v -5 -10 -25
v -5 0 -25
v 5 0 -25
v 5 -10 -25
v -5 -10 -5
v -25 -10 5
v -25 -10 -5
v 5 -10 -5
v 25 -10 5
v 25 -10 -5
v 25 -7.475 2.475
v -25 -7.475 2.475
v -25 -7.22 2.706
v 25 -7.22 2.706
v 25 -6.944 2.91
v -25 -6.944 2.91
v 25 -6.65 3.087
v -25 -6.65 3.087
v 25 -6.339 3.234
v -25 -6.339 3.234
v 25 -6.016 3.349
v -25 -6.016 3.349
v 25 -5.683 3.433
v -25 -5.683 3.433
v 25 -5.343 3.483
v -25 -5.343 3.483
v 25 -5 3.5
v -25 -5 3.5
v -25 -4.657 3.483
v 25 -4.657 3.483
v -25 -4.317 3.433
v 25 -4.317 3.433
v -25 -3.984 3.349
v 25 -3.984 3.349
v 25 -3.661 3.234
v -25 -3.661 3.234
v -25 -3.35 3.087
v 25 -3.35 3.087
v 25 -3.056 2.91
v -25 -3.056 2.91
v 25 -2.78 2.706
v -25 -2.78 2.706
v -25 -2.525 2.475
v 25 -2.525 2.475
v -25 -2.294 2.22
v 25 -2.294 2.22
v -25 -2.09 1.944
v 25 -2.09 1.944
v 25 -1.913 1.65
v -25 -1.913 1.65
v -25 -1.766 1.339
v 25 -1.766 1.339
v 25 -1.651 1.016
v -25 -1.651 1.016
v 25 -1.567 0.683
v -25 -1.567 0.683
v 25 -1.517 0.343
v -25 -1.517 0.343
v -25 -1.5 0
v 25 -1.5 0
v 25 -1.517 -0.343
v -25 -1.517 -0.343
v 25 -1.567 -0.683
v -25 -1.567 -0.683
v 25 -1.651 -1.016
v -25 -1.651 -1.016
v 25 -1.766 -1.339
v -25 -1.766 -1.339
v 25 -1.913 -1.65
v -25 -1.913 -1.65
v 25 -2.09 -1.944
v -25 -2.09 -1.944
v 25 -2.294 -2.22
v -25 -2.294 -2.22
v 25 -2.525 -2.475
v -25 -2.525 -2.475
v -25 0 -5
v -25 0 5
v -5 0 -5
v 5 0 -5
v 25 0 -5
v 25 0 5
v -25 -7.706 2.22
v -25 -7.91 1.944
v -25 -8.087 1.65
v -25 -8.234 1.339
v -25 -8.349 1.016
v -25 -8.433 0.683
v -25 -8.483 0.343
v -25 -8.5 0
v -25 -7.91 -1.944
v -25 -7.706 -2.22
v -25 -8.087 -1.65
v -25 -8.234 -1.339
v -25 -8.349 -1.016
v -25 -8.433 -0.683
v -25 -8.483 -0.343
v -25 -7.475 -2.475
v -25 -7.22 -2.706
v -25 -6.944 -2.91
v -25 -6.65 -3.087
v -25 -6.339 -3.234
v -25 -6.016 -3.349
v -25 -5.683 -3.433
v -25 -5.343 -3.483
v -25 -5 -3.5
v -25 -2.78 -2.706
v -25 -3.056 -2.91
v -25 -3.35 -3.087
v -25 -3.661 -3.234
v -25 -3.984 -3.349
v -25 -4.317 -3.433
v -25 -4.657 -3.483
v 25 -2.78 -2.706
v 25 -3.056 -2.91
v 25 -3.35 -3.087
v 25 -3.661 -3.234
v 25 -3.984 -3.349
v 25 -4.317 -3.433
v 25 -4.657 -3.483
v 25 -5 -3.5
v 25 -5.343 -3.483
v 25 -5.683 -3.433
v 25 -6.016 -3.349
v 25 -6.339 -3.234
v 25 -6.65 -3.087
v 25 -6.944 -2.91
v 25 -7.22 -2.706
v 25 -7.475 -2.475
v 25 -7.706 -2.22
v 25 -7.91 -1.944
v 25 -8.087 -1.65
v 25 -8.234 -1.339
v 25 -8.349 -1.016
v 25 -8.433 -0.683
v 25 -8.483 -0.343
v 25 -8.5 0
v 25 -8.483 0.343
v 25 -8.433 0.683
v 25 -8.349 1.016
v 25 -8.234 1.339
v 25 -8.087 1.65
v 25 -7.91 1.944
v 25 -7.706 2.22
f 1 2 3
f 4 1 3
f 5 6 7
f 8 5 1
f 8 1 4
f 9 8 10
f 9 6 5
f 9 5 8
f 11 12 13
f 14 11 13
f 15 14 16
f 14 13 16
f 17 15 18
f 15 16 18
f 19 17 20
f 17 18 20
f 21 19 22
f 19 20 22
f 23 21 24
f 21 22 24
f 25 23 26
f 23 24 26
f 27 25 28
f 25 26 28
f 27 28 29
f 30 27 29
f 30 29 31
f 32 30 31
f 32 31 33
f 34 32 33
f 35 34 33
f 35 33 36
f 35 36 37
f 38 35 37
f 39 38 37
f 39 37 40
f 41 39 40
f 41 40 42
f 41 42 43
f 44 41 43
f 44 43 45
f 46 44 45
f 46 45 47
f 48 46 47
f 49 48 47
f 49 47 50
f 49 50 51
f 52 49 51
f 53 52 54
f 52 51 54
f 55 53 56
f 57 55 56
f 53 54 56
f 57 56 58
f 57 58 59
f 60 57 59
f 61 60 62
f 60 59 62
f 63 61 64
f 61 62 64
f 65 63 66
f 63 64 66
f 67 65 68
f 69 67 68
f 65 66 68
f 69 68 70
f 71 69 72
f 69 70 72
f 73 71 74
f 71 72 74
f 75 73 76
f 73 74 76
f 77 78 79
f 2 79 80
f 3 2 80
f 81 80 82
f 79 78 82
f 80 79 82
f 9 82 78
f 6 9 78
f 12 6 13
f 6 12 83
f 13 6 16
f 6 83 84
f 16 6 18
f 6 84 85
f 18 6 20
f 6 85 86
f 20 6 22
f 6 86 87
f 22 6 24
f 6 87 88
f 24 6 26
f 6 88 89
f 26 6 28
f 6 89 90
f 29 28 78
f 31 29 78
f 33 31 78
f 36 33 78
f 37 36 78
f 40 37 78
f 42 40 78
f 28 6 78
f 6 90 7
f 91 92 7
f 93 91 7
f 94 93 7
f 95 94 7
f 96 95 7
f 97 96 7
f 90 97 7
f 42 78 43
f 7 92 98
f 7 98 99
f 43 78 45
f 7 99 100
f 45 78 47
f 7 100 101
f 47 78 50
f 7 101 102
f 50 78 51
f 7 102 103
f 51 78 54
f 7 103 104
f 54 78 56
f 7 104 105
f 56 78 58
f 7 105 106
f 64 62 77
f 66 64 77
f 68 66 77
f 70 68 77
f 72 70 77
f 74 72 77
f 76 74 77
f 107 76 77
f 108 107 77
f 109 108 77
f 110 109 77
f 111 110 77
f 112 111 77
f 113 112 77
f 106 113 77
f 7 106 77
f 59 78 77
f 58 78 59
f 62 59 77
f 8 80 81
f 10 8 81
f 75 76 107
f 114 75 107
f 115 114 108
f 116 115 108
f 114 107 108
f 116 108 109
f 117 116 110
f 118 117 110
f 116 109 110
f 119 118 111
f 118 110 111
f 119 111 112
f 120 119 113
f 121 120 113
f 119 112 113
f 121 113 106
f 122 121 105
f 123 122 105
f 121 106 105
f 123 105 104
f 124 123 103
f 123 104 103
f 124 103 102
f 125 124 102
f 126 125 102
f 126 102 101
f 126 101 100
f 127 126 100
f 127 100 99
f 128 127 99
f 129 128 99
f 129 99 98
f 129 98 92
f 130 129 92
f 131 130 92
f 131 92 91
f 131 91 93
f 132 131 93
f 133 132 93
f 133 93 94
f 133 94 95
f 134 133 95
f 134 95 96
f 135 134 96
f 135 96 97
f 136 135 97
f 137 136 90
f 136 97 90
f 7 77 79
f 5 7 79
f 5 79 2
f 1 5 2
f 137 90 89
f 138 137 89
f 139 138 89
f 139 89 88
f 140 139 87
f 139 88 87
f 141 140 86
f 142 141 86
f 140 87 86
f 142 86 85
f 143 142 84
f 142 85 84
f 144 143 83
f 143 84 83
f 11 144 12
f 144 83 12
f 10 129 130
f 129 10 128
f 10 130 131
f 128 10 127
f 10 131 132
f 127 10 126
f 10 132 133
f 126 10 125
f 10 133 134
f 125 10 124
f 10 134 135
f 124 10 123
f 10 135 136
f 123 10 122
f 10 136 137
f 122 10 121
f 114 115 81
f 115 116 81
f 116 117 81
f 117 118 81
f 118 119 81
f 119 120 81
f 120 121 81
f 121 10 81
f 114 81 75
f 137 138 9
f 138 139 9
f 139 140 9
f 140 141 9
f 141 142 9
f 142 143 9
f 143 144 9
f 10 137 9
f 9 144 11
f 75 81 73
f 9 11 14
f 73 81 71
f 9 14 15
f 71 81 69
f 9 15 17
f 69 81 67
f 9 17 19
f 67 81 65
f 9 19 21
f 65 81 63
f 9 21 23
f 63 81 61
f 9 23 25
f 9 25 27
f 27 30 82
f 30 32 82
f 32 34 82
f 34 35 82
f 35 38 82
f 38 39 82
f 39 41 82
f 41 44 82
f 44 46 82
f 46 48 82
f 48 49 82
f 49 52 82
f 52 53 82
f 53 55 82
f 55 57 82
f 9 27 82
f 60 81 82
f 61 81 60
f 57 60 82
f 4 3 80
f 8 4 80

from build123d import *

# Parameters (mm, degrees)
F1_DEPTH = 10
F3_DEPTH = 50.001


with BuildPart() as f1:
    # F0 (on Front) → F1 (new body)
    with BuildSketch(Plane.XZ):
        Polygon((25, -5), (25, 5), (-25, 5), (-25, -5), (-5, -5), (-5, -25), (5, -25), (5, -5), align=None)
    extrude(amount=F1_DEPTH)

    # F2 (on face) → F3 (cut, through all)
    with BuildSketch(Plane(origin=(-25, 0, 0), x_dir=(0, -1, 0), z_dir=(-1, 0, 0))):
        with BuildLine():
            ThreePointArc((2.525126, -2.474874), (6.339392, -3.233578), (8.5, 0))
            ThreePointArc((8.5, 0), (8.233578, 1.339392), (7.474874, 2.474874))
            ThreePointArc((7.474874, 2.474874), (2.525126, 2.474874), (2.525126, -2.474874))
        make_face()
    extrude(amount=-F3_DEPTH, mode=Mode.SUBTRACT)


solid = f1.part
